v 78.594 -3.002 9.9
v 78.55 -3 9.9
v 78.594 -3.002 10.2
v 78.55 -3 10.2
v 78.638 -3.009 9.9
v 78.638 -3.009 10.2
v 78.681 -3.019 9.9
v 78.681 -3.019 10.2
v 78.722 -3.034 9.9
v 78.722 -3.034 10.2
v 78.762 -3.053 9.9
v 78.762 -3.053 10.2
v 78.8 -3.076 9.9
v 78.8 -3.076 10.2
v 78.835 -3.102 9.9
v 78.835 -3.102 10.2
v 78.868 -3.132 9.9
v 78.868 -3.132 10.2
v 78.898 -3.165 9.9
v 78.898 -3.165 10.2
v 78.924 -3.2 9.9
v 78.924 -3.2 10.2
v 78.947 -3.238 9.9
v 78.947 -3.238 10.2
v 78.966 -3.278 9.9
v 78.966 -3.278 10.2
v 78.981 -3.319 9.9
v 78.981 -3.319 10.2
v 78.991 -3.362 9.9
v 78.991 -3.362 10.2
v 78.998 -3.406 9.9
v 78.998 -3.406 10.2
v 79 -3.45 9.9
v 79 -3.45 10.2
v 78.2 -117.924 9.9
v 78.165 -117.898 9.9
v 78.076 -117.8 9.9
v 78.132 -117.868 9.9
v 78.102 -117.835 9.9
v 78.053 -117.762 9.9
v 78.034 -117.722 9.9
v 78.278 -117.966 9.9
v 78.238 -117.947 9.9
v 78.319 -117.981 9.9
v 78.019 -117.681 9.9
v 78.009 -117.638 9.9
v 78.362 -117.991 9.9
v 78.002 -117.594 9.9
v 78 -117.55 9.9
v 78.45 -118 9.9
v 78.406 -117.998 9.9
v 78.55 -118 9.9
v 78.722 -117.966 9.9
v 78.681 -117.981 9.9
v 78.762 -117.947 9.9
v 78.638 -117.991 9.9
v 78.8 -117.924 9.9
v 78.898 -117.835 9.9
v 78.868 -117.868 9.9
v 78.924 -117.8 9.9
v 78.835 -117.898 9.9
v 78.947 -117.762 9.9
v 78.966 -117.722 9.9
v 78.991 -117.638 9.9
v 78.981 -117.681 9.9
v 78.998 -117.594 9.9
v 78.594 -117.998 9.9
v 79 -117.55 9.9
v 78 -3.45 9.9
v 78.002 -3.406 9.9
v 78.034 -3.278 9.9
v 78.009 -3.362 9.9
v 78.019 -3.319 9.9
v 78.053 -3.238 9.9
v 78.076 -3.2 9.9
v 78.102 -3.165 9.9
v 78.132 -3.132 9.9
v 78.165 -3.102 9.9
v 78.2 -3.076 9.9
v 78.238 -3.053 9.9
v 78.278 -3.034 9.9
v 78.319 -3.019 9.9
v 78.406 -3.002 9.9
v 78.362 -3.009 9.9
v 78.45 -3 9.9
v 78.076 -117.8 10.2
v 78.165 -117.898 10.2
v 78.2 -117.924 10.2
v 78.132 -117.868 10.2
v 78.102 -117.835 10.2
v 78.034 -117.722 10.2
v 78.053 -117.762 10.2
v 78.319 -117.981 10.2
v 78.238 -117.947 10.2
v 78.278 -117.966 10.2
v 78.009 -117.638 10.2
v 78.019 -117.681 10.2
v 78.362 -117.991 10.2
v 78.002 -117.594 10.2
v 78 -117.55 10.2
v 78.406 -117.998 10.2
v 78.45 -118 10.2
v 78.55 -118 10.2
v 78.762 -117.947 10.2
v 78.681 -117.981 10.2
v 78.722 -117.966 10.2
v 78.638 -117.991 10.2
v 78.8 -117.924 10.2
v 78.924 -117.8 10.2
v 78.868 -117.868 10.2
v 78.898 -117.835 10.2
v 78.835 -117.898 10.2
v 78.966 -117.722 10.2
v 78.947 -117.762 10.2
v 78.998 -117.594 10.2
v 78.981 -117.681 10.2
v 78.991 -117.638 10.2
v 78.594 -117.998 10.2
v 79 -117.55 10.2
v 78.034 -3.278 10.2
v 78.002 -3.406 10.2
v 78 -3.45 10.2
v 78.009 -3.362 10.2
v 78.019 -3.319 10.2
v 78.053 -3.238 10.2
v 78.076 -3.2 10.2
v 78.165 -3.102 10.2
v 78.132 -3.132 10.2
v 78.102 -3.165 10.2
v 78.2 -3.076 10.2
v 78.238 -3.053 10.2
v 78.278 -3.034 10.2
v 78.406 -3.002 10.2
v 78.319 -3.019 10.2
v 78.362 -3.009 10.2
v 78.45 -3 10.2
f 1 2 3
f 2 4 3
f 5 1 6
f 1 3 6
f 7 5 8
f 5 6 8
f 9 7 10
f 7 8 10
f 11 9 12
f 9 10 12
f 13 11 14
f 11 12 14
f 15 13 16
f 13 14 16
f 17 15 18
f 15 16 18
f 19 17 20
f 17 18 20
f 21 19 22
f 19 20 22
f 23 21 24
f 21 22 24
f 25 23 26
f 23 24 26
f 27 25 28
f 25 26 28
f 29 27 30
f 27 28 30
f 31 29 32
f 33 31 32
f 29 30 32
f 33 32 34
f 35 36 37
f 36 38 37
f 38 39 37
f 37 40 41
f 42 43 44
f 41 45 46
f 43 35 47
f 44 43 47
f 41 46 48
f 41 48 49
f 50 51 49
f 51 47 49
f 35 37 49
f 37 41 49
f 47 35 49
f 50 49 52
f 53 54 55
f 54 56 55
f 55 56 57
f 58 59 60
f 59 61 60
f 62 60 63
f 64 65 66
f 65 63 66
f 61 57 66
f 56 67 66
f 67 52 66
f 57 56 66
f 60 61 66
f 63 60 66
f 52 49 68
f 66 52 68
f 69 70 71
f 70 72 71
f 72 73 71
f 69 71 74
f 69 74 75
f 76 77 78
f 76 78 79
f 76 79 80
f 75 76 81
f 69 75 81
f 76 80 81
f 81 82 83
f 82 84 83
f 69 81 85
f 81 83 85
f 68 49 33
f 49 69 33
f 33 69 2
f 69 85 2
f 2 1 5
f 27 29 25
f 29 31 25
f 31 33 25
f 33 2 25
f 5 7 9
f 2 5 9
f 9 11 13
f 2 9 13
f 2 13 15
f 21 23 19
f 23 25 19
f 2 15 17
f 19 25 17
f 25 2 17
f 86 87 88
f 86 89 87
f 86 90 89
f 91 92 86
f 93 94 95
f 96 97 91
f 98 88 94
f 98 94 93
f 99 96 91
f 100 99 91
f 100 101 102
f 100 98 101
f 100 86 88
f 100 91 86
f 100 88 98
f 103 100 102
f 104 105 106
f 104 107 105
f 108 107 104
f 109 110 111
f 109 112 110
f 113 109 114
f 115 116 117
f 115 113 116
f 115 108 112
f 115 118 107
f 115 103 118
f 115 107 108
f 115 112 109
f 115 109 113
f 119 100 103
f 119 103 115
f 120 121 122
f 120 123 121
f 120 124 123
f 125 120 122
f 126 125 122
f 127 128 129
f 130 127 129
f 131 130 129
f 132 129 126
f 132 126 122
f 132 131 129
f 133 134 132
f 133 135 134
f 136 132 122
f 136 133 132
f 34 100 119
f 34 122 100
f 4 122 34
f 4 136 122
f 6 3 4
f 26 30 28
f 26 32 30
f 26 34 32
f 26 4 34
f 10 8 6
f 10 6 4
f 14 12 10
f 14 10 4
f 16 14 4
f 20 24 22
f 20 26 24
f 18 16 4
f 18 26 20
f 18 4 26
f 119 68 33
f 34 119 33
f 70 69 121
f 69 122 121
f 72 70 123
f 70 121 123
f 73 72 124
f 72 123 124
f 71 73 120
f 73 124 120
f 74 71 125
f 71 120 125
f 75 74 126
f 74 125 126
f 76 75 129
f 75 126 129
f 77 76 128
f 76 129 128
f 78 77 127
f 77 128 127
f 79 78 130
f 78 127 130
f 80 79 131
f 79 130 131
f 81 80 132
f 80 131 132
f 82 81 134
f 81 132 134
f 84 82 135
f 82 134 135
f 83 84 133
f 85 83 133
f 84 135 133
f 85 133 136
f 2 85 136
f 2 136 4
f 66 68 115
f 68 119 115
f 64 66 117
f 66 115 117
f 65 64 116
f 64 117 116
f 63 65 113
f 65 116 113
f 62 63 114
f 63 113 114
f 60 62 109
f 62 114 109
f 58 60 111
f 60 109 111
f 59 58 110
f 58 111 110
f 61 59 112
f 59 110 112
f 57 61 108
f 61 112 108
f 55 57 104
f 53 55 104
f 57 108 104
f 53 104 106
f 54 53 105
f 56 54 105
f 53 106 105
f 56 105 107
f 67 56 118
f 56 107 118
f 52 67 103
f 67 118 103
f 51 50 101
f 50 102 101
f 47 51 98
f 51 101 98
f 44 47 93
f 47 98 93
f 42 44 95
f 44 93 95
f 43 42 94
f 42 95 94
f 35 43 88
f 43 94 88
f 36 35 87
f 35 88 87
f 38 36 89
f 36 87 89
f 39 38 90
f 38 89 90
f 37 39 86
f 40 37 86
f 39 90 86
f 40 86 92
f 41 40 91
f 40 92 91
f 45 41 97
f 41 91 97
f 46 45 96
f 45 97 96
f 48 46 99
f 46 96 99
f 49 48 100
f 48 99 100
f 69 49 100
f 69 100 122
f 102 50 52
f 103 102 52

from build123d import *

# Parameters (mm, degrees)
BOX005_W     = 1
BOX005_H     = 115
BOX005_DEPTH = 0.3
FILLET007_R  = 0.45
FILLET008_R  = 0.45
FILLET011_R  = 0.45
FILLET012_R  = 0.45


with BuildPart() as part:
    # Box005 → Box005 (new body)
    with BuildSketch(Plane(origin=(78, -118, 9.9), x_dir=(1, 0, 0), z_dir=(0, 0, 1))):
        with Locations((0.5, 57.5)):
            Rectangle(BOX005_W, BOX005_H)
    extrude(amount=BOX005_DEPTH)

    # Fillet007
    fillet007_edges = [part.edges().sort_by_distance(p)[0] for p in [
        (78, -3, 10.05),
    ]]
    fillet(fillet007_edges, radius=FILLET007_R)

    # Fillet008
    fillet008_edges = [part.edges().sort_by_distance(p)[0] for p in [
        (79, -3, 10.05),
    ]]
    fillet(fillet008_edges, radius=FILLET008_R)

    # Fillet011
    fillet011_edges = [part.edges().sort_by_distance(p)[0] for p in [
        (79, -118, 10.05),
    ]]
    fillet(fillet011_edges, radius=FILLET011_R)

    # Fillet012
    fillet012_edges = [part.edges().sort_by_distance(p)[0] for p in [
        (78, -118, 10.05),
    ]]
    fillet(fillet012_edges, radius=FILLET012_R)


solid = part.part
